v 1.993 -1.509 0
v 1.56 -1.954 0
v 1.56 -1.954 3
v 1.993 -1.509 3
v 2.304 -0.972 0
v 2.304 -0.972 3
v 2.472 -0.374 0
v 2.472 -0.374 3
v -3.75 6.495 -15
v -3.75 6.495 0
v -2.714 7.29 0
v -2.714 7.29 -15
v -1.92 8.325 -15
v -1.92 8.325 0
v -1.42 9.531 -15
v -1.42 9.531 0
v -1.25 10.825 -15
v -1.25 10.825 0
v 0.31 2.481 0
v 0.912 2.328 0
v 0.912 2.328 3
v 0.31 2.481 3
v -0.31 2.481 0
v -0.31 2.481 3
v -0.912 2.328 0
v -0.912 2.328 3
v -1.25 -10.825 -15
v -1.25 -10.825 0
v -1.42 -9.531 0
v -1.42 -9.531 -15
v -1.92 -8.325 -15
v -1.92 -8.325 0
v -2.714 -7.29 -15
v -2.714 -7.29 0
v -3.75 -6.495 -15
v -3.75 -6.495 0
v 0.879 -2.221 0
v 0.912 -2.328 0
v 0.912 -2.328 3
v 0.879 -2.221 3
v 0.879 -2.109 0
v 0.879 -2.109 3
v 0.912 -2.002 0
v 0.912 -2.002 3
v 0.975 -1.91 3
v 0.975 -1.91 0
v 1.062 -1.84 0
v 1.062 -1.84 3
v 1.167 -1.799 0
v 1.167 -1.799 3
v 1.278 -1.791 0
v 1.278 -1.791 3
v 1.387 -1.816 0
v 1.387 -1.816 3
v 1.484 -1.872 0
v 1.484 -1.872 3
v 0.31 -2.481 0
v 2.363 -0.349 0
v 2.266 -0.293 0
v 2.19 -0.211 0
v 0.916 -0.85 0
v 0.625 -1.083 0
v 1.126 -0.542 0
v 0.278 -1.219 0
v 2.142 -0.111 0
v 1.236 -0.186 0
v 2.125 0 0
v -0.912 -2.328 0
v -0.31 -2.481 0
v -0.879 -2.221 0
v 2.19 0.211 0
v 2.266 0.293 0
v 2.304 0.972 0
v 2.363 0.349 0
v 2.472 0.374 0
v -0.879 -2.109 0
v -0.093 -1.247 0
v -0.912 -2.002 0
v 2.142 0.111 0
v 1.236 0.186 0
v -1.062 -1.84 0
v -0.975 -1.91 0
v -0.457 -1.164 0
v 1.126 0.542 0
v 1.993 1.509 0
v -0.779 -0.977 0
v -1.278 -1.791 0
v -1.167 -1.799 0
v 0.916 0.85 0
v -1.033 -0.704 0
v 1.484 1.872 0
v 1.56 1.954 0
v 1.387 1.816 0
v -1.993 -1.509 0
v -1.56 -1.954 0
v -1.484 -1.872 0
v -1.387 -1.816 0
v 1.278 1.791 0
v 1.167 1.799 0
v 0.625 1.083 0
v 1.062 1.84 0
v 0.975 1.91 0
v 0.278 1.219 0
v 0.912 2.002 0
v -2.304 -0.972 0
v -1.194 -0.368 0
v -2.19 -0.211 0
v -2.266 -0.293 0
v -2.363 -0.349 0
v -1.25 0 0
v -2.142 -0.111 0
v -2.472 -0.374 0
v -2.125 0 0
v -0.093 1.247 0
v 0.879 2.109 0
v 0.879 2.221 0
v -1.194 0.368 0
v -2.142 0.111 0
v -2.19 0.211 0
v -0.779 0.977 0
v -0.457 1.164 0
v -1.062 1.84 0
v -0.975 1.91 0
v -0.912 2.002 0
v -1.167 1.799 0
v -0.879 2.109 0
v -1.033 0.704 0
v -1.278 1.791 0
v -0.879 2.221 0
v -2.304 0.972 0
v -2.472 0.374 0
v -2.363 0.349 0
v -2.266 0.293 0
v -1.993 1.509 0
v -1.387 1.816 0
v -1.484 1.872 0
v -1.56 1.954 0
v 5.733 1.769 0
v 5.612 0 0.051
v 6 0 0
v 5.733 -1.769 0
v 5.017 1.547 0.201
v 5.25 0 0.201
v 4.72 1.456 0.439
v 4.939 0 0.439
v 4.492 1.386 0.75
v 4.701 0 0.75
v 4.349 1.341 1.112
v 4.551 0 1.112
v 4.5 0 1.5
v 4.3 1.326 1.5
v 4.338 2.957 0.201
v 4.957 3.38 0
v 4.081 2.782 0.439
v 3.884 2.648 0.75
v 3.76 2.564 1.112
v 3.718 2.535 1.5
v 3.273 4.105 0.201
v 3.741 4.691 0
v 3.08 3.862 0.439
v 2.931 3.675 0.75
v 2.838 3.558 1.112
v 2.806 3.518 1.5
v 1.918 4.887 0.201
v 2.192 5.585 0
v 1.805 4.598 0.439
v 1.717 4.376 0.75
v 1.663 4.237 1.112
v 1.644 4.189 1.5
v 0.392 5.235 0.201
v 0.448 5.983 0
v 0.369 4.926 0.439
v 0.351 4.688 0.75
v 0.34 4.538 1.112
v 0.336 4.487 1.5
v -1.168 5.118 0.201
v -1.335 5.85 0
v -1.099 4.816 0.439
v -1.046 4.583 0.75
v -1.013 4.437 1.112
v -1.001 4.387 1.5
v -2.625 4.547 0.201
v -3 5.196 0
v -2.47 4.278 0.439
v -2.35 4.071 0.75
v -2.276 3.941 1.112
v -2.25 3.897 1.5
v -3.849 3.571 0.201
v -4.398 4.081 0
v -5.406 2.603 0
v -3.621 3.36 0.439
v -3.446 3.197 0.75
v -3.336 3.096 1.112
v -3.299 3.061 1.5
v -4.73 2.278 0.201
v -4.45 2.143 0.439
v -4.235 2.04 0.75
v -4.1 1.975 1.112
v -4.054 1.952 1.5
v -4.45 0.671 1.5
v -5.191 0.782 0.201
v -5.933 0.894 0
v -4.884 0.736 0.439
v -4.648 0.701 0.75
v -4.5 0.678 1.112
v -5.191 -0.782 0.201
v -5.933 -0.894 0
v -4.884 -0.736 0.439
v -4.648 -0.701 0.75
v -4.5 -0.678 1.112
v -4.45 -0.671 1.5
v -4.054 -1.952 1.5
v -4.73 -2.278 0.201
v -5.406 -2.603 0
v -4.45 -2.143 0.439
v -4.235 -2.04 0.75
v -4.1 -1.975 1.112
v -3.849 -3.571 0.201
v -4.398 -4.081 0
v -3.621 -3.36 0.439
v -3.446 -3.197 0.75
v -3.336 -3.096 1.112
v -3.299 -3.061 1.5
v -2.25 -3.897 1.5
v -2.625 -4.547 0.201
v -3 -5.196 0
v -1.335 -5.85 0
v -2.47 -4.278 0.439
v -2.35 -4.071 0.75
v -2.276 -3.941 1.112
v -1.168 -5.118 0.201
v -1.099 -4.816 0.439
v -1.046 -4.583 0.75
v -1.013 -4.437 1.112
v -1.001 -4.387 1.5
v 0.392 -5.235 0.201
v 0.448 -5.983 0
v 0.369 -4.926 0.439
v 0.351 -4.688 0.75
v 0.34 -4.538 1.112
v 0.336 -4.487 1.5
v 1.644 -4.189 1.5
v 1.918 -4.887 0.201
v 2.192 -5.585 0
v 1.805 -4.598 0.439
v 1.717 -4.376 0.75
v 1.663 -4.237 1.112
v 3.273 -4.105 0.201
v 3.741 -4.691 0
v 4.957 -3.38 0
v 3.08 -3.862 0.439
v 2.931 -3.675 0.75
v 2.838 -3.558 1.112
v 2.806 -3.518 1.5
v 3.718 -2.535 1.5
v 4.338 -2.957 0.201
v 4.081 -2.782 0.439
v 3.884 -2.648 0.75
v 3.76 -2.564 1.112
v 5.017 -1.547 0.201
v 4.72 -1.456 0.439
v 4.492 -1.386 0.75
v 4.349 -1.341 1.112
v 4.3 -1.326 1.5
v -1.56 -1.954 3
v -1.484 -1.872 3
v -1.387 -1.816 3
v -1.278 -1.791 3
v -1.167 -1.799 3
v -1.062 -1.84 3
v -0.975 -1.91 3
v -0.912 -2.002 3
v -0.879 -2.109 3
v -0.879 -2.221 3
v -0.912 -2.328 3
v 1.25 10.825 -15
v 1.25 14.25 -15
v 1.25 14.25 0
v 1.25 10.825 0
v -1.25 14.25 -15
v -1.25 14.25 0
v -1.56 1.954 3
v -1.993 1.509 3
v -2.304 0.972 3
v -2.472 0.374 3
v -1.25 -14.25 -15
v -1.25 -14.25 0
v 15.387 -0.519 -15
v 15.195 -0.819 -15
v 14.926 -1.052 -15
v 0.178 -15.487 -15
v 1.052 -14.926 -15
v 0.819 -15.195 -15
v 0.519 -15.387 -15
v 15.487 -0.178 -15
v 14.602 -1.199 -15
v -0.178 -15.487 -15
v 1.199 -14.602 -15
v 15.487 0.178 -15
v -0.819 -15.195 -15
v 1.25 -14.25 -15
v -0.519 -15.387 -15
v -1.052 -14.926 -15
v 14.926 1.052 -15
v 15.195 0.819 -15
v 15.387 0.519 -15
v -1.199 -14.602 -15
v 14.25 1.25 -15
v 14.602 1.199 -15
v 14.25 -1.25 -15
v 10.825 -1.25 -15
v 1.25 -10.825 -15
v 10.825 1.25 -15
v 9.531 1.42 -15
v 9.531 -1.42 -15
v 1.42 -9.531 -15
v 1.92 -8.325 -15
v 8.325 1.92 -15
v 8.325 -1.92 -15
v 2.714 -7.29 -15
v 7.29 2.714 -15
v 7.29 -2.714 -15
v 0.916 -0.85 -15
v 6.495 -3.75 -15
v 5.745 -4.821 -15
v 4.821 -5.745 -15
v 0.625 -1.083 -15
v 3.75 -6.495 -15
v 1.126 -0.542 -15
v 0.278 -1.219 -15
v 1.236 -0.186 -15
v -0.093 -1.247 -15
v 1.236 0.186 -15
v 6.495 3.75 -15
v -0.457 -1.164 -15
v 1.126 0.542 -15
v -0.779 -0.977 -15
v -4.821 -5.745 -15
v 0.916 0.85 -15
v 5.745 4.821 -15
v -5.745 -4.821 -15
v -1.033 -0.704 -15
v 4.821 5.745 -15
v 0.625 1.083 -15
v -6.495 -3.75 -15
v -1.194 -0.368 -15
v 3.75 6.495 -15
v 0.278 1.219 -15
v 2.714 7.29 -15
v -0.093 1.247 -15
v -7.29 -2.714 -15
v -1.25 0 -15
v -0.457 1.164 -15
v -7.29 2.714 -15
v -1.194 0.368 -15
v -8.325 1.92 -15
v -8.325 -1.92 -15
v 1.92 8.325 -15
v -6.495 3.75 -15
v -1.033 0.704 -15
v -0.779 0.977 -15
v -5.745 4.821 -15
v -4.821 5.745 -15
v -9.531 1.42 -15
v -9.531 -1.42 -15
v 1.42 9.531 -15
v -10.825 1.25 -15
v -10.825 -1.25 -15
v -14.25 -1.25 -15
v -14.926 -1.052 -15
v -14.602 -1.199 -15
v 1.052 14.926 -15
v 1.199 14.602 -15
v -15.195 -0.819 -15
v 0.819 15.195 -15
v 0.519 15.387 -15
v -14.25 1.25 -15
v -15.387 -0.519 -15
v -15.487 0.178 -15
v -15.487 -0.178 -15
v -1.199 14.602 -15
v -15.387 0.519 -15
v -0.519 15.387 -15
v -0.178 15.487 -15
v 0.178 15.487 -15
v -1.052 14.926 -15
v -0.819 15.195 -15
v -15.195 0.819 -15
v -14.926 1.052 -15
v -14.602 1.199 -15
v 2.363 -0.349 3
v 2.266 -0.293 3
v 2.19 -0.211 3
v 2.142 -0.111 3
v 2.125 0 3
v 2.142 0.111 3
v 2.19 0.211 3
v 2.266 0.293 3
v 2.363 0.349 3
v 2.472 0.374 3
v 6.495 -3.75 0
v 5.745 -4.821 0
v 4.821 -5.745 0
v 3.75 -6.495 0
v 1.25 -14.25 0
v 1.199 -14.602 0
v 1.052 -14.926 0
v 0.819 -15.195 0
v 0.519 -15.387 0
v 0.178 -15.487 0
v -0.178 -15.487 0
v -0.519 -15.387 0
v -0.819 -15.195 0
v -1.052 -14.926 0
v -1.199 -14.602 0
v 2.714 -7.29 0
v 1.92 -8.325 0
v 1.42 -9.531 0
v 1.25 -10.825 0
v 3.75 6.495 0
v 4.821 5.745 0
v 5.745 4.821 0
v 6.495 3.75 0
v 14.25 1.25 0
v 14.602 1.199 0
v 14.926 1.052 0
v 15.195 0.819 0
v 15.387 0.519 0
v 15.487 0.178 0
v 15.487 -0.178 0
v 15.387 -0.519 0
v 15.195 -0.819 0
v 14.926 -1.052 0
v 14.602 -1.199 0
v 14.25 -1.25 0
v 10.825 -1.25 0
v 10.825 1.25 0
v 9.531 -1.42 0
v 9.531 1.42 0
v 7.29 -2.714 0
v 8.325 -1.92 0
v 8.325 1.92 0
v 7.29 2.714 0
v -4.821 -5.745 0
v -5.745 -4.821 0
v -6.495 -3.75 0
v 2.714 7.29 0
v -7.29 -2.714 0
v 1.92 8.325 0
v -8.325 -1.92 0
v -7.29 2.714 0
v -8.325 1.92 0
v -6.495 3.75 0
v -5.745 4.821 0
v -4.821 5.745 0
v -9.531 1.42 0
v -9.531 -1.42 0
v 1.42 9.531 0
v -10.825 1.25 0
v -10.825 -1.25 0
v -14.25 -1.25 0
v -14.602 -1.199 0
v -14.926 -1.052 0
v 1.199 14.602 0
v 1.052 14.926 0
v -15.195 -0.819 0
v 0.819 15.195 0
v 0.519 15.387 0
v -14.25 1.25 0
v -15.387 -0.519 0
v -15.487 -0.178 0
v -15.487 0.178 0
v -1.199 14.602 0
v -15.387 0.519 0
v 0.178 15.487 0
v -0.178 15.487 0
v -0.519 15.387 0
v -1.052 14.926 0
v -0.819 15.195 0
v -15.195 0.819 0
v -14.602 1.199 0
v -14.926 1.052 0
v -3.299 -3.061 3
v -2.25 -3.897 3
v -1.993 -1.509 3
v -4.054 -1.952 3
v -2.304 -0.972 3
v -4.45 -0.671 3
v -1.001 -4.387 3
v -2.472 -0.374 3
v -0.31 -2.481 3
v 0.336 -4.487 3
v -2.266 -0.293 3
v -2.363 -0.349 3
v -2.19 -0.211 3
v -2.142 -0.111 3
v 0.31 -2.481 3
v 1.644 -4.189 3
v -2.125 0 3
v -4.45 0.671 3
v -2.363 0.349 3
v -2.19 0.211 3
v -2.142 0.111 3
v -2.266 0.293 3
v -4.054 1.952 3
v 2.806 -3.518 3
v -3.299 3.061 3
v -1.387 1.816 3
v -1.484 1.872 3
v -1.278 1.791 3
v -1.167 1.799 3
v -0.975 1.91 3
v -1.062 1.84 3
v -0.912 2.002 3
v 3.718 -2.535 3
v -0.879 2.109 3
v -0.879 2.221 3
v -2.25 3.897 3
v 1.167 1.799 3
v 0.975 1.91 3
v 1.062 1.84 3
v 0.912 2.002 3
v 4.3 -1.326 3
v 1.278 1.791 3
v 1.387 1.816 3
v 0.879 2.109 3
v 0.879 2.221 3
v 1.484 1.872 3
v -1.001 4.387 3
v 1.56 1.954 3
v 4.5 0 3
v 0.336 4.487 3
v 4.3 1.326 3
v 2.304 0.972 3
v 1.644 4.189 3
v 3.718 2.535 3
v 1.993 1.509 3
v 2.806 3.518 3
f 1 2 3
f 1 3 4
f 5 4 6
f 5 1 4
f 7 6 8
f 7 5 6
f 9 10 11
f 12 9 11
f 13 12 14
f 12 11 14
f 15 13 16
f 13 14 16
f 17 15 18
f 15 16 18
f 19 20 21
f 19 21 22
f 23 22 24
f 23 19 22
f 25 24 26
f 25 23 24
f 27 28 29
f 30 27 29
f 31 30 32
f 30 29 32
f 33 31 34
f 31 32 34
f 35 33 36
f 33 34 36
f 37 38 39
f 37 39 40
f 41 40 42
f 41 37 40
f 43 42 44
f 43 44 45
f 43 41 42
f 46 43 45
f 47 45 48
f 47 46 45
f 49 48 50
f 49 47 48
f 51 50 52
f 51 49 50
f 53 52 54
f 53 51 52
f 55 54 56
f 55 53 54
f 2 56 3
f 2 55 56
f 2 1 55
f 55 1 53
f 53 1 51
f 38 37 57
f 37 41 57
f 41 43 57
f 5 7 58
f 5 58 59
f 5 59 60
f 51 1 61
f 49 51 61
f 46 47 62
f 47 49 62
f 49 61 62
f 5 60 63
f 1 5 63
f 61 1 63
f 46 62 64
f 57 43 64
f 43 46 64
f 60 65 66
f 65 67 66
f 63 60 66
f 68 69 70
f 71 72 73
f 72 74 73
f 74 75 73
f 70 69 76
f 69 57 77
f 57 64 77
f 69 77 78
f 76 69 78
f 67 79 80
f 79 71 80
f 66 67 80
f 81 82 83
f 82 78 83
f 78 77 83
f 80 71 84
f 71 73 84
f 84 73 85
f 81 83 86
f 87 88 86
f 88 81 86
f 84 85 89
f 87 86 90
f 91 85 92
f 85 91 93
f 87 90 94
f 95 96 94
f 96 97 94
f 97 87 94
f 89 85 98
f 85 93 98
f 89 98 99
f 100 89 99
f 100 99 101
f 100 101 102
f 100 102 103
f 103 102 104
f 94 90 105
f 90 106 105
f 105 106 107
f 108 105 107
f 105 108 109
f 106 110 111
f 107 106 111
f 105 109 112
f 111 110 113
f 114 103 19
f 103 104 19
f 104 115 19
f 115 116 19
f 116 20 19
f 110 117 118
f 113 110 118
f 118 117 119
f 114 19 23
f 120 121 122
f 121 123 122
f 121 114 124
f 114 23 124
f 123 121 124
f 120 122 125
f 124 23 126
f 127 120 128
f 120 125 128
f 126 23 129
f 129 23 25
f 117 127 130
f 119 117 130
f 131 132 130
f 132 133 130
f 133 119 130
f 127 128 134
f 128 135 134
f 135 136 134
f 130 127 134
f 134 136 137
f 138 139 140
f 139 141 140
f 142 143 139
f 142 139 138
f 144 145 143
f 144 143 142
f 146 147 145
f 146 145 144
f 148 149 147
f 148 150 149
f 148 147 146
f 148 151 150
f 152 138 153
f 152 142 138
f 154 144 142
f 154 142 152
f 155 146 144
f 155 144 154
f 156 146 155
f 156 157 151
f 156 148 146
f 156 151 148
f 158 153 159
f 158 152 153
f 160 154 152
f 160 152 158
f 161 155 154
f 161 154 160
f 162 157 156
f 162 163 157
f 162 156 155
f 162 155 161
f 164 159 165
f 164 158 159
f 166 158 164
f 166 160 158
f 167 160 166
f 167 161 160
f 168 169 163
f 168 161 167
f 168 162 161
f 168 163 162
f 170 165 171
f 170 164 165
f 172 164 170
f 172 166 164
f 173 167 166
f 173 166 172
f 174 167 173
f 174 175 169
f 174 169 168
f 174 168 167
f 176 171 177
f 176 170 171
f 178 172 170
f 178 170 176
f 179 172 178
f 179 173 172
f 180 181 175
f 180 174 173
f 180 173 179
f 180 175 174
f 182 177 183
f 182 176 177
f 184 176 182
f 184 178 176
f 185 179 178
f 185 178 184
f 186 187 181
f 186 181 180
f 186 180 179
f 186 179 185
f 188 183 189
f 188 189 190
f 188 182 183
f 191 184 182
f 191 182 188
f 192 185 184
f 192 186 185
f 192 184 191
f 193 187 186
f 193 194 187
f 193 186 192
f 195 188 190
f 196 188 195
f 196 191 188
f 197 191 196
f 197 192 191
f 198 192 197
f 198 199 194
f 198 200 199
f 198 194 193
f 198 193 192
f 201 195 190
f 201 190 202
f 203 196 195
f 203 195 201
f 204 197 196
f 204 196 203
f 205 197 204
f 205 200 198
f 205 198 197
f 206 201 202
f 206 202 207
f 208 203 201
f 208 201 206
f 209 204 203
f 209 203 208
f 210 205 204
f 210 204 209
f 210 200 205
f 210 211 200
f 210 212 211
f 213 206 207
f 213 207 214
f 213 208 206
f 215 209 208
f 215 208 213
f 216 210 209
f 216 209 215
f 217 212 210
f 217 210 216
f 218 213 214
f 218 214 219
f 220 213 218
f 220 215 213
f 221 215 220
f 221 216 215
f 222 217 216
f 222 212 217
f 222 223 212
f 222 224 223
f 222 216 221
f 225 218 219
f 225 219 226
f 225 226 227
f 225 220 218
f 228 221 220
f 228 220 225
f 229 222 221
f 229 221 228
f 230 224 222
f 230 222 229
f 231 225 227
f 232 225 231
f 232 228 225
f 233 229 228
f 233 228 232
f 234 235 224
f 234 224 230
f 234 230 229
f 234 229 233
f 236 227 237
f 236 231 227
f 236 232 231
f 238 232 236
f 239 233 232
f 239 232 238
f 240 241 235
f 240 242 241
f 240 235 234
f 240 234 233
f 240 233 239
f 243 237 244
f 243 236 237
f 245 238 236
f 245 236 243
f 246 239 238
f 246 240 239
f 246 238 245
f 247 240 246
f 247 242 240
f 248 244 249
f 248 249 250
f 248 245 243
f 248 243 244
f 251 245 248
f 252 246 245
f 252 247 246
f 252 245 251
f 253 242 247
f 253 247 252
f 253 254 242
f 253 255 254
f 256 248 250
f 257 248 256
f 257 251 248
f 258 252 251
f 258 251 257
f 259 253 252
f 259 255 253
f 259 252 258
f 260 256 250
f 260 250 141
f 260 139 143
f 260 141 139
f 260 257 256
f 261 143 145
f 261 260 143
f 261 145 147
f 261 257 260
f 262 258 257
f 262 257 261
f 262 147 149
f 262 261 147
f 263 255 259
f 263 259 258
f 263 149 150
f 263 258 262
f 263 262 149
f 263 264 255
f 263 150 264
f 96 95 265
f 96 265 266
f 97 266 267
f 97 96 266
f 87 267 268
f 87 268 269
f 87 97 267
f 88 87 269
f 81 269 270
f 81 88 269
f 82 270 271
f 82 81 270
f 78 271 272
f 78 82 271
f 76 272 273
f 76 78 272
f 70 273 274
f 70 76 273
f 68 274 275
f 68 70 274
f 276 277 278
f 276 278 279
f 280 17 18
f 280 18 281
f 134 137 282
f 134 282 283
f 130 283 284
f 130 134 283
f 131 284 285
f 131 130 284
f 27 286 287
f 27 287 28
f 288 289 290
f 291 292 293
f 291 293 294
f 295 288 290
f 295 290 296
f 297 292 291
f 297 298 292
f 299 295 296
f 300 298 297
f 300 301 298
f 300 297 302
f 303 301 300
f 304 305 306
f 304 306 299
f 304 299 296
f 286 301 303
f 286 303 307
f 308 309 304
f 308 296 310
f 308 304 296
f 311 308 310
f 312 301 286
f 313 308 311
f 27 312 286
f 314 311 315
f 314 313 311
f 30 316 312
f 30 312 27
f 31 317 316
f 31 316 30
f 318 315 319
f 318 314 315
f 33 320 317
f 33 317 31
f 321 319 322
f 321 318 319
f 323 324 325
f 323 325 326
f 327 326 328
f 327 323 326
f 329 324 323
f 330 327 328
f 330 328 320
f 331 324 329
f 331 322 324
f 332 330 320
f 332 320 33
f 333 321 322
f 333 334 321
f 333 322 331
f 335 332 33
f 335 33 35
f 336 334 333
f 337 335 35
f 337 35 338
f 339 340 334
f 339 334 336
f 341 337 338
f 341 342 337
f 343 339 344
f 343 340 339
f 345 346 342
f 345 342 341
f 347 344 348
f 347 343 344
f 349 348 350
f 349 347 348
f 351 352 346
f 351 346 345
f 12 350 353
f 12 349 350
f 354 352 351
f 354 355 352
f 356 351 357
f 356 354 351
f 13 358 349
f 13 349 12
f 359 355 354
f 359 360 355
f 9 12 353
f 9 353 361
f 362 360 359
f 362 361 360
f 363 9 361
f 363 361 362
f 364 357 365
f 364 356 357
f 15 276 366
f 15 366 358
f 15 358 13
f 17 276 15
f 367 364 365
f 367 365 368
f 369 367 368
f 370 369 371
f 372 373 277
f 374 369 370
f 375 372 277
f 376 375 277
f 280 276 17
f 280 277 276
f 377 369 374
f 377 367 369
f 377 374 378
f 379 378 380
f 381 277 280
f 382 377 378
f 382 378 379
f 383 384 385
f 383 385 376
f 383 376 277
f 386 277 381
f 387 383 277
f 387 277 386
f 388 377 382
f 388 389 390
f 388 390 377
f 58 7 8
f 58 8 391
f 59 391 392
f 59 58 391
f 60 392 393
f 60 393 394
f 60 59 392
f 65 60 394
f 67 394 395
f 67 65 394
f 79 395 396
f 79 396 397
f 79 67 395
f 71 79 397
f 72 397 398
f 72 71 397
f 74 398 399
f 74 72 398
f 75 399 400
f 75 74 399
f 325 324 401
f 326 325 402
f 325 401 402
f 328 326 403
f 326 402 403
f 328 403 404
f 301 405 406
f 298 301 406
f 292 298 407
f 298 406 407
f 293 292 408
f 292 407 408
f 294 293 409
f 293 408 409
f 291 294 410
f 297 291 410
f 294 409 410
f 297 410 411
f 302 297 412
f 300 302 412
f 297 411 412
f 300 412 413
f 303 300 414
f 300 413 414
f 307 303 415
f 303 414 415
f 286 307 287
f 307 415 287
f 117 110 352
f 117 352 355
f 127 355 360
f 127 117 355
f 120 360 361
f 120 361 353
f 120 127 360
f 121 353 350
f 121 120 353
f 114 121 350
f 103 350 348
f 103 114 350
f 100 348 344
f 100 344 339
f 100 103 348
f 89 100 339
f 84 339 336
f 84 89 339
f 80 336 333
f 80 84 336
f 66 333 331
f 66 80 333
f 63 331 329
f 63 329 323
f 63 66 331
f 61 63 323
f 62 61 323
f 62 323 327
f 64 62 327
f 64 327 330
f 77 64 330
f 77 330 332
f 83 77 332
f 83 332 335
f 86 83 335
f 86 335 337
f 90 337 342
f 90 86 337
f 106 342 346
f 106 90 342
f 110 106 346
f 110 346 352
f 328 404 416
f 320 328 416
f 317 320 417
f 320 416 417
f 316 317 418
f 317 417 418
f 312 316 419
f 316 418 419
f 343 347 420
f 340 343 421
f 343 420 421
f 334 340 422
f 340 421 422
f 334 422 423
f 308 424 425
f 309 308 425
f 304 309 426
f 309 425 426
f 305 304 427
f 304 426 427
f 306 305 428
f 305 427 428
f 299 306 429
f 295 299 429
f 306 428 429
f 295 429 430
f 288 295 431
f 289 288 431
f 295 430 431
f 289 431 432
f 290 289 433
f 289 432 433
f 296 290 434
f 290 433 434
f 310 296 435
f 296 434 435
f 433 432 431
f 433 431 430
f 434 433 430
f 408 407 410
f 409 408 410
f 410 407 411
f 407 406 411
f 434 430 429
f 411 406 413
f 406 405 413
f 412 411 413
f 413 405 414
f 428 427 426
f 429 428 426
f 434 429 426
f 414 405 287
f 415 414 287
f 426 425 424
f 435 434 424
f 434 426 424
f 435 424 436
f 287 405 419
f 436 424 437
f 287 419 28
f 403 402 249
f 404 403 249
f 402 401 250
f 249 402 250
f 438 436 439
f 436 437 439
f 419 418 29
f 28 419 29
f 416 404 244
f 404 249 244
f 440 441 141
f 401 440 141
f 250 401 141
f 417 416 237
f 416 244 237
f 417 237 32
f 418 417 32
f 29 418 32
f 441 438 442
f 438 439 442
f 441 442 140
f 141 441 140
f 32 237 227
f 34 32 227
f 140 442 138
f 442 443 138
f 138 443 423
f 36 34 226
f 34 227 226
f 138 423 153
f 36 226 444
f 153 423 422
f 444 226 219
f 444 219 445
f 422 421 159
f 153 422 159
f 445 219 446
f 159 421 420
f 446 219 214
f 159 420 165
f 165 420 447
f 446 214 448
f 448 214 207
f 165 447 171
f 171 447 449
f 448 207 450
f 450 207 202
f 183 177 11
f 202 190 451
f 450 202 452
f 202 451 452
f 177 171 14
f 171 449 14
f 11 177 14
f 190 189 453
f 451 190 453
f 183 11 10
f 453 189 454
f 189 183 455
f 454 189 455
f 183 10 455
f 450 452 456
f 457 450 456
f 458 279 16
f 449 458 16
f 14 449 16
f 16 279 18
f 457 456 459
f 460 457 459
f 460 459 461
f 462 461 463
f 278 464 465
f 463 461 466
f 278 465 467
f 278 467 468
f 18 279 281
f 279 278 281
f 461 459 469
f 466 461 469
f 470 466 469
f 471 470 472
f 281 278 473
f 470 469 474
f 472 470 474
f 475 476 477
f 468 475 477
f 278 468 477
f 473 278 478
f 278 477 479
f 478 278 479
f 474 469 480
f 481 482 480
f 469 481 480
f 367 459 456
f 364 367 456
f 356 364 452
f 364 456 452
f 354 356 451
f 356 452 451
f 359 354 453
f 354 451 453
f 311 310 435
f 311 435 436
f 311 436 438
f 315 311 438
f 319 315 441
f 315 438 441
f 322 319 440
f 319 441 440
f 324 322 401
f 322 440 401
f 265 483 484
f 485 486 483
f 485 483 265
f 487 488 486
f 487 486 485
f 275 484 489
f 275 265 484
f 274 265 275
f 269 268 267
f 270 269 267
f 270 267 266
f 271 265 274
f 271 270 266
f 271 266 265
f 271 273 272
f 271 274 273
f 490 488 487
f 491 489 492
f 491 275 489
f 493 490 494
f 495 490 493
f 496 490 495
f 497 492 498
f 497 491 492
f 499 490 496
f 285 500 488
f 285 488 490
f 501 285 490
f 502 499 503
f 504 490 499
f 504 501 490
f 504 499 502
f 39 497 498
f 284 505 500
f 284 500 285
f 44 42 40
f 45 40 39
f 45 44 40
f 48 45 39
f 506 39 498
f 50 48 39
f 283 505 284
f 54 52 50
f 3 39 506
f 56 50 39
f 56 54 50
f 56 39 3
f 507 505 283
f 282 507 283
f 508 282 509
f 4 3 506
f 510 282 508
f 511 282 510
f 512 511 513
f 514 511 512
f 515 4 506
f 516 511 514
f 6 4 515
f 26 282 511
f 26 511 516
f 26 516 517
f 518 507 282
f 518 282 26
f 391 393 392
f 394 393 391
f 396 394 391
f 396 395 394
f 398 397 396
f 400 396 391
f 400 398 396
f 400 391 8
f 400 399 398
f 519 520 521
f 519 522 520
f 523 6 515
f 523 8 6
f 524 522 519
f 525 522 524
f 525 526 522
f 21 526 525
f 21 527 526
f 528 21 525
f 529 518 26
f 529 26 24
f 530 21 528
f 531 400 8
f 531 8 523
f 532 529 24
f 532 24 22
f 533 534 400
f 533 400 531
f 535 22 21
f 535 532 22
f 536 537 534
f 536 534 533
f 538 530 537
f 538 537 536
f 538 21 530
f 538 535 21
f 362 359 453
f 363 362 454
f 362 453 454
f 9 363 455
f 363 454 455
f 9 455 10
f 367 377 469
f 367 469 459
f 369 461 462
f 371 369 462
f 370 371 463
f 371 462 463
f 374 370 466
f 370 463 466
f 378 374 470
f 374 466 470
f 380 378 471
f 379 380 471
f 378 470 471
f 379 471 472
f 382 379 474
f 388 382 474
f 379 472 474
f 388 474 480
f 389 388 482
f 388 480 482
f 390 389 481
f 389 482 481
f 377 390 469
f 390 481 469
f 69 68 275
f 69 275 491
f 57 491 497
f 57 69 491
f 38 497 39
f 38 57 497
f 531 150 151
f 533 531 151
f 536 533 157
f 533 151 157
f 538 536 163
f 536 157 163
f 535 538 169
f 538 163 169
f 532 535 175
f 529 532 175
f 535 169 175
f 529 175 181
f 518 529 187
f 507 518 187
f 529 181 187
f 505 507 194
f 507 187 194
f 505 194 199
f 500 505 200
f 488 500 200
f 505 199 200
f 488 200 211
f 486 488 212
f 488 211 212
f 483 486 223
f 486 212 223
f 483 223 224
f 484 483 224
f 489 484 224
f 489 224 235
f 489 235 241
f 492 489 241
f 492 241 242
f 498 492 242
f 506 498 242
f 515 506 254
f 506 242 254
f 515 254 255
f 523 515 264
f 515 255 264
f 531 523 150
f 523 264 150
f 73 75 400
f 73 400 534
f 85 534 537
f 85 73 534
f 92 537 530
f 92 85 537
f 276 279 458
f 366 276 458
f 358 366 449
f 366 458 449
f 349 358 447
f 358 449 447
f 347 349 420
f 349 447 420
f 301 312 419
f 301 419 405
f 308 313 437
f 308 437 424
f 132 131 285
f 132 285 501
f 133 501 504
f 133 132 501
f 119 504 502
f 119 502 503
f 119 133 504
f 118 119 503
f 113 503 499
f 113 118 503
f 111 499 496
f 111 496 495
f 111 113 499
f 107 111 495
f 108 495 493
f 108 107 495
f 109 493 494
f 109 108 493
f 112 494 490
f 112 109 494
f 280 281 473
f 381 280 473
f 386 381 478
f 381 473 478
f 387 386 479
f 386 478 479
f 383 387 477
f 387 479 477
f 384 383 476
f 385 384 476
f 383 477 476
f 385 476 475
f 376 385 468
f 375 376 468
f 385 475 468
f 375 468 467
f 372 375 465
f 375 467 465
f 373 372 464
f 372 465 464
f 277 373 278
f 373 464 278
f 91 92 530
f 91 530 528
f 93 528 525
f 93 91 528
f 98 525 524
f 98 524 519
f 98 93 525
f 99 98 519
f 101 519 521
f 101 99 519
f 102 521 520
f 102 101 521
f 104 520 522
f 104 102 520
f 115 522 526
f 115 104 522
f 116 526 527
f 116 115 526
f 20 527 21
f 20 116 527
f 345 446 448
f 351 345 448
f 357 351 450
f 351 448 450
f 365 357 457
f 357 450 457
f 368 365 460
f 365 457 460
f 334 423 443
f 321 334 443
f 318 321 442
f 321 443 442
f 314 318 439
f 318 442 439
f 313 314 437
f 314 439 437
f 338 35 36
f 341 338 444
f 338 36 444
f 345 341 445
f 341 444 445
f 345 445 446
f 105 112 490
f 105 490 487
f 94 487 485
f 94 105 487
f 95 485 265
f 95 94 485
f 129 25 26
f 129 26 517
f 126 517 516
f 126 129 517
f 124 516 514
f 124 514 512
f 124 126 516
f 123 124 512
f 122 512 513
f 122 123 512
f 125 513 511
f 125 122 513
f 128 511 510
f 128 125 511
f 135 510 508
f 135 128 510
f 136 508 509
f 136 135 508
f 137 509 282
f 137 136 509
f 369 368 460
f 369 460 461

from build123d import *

# Parameters (mm, degrees)
CROQUIS2_R              = 4.5
SALIENTE_EXTRUIR1_DEPTH = 3
CROQUIS3_R              = 1.25
SALIENTE_EXTRUIR2_DEPTH = 15
REDONDEO1_R             = 1.5


with BuildPart() as part:
    # Croquis2 → Saliente-Extruir1 (new body)
    with BuildSketch(Plane.XY):
        Circle(CROQUIS2_R)
        with BuildLine():
            ThreePointArc((2.471875, 0.373943825), (2.165063509, 1.25), (1.559782352, 1.953734632))
            ThreePointArc((1.559782352, 1.953734632), (1.0625, 1.840303983), (0.912092648, 2.327678458))
            ThreePointArc((0.912092648, 2.327678458), (0, 2.5), (-0.912092648, 2.327678458))
            ThreePointArc((-0.912092648, 2.327678458), (-1.0625, 1.840303983), (-1.559782352, 1.953734632))
            ThreePointArc((-1.559782352, 1.953734632), (-2.165063509, 1.25), (-2.471875, 0.373943825))
            ThreePointArc((-2.471875, 0.373943825), (-2.125, 0), (-2.471875, -0.373943825))
            ThreePointArc((-2.471875, -0.373943825), (-2.165063509, -1.25), (-1.559782352, -1.953734632))
            ThreePointArc((-1.559782352, -1.953734632), (-1.0625, -1.840303983), (-0.912092648, -2.327678458))
            ThreePointArc((-0.912092648, -2.327678458), (0, -2.5), (0.912092648, -2.327678458))
            ThreePointArc((0.912092648, -2.327678458), (1.0625, -1.840303983), (1.559782352, -1.953734632))
            ThreePointArc((1.559782352, -1.953734632), (2.165063509, -1.25), (2.471875, -0.373943825))
            ThreePointArc((2.471875, -0.373943825), (2.125, 0), (2.471875, 0.373943825))
        make_face(mode=Mode.SUBTRACT)
    extrude(amount=SALIENTE_EXTRUIR1_DEPTH)

    # Croquis3 → Saliente-Extruir2 (add)
    with BuildSketch(Plane(origin=(0, 0, 0), x_dir=(-1, 0, 0), z_dir=(0, 0, -1))):
        with BuildLine():
            Line((1.25, 10.825317547), (1.25, 14.25))
            ThreePointArc((1.25, 14.25), (0, 15.5), (-1.25, 14.25))
            Line((-1.25, 14.25), (-1.25, 10.825317547))
            ThreePointArc((-1.25, 10.825317547), (-1.919872981, 8.325317547), (-3.75, 6.495190528))
            ThreePointArc((-3.75, 6.495190528), (-5.303300859, 5.303300859), (-6.495190528, 3.75))
            ThreePointArc((-6.495190528, 3.75), (-8.325317547, 1.919872981), (-10.825317547, 1.25))
            Line((-10.825317547, 1.25), (-14.25, 1.25))
            ThreePointArc((-14.25, 1.25), (-15.5, 0), (-14.25, -1.25))
            Line((-14.25, -1.25), (-10.825317547, -1.25))
            ThreePointArc((-10.825317547, -1.25), (-8.325317547, -1.919872981), (-6.495190528, -3.75))
            ThreePointArc((-6.495190528, -3.75), (-5.303300859, -5.303300859), (-3.75, -6.495190528))
            ThreePointArc((-3.75, -6.495190528), (-1.919872981, -8.325317547), (-1.25, -10.825317547))
            Line((-1.25, -10.825317547), (-1.25, -14.25))
            ThreePointArc((-1.25, -14.25), (0, -15.5), (1.25, -14.25))
            Line((1.25, -14.25), (1.25, -10.825317547))
            ThreePointArc((1.25, -10.825317547), (1.919872981, -8.325317547), (3.75, -6.495190528))
            ThreePointArc((3.75, -6.495190528), (5.303300859, -5.303300859), (6.495190528, -3.75))
            ThreePointArc((6.495190528, -3.75), (8.325317547, -1.919872981), (10.825317547, -1.25))
            Line((10.825317547, -1.25), (14.25, -1.25))
            ThreePointArc((14.25, -1.25), (15.5, 0), (14.25, 1.25))
            Line((14.25, 1.25), (10.825317547, 1.25))
            ThreePointArc((10.825317547, 1.25), (8.325317547, 1.919872981), (6.495190528, 3.75))
            ThreePointArc((6.495190528, 3.75), (5.303300859, 5.303300859), (3.75, 6.495190528))
            ThreePointArc((3.75, 6.495190528), (1.919872981, 8.325317547), (1.25, 10.825317547))
        make_face()
        Circle(CROQUIS3_R, mode=Mode.SUBTRACT)
    extrude(amount=SALIENTE_EXTRUIR2_DEPTH)

    # Redondeo1
    redondeo1_edges = [part.edges().sort_by_distance(p)[0] for p in [
        (-4.5, 0, 0),
    ]]
    fillet(redondeo1_edges, radius=REDONDEO1_R)


solid = part.part
